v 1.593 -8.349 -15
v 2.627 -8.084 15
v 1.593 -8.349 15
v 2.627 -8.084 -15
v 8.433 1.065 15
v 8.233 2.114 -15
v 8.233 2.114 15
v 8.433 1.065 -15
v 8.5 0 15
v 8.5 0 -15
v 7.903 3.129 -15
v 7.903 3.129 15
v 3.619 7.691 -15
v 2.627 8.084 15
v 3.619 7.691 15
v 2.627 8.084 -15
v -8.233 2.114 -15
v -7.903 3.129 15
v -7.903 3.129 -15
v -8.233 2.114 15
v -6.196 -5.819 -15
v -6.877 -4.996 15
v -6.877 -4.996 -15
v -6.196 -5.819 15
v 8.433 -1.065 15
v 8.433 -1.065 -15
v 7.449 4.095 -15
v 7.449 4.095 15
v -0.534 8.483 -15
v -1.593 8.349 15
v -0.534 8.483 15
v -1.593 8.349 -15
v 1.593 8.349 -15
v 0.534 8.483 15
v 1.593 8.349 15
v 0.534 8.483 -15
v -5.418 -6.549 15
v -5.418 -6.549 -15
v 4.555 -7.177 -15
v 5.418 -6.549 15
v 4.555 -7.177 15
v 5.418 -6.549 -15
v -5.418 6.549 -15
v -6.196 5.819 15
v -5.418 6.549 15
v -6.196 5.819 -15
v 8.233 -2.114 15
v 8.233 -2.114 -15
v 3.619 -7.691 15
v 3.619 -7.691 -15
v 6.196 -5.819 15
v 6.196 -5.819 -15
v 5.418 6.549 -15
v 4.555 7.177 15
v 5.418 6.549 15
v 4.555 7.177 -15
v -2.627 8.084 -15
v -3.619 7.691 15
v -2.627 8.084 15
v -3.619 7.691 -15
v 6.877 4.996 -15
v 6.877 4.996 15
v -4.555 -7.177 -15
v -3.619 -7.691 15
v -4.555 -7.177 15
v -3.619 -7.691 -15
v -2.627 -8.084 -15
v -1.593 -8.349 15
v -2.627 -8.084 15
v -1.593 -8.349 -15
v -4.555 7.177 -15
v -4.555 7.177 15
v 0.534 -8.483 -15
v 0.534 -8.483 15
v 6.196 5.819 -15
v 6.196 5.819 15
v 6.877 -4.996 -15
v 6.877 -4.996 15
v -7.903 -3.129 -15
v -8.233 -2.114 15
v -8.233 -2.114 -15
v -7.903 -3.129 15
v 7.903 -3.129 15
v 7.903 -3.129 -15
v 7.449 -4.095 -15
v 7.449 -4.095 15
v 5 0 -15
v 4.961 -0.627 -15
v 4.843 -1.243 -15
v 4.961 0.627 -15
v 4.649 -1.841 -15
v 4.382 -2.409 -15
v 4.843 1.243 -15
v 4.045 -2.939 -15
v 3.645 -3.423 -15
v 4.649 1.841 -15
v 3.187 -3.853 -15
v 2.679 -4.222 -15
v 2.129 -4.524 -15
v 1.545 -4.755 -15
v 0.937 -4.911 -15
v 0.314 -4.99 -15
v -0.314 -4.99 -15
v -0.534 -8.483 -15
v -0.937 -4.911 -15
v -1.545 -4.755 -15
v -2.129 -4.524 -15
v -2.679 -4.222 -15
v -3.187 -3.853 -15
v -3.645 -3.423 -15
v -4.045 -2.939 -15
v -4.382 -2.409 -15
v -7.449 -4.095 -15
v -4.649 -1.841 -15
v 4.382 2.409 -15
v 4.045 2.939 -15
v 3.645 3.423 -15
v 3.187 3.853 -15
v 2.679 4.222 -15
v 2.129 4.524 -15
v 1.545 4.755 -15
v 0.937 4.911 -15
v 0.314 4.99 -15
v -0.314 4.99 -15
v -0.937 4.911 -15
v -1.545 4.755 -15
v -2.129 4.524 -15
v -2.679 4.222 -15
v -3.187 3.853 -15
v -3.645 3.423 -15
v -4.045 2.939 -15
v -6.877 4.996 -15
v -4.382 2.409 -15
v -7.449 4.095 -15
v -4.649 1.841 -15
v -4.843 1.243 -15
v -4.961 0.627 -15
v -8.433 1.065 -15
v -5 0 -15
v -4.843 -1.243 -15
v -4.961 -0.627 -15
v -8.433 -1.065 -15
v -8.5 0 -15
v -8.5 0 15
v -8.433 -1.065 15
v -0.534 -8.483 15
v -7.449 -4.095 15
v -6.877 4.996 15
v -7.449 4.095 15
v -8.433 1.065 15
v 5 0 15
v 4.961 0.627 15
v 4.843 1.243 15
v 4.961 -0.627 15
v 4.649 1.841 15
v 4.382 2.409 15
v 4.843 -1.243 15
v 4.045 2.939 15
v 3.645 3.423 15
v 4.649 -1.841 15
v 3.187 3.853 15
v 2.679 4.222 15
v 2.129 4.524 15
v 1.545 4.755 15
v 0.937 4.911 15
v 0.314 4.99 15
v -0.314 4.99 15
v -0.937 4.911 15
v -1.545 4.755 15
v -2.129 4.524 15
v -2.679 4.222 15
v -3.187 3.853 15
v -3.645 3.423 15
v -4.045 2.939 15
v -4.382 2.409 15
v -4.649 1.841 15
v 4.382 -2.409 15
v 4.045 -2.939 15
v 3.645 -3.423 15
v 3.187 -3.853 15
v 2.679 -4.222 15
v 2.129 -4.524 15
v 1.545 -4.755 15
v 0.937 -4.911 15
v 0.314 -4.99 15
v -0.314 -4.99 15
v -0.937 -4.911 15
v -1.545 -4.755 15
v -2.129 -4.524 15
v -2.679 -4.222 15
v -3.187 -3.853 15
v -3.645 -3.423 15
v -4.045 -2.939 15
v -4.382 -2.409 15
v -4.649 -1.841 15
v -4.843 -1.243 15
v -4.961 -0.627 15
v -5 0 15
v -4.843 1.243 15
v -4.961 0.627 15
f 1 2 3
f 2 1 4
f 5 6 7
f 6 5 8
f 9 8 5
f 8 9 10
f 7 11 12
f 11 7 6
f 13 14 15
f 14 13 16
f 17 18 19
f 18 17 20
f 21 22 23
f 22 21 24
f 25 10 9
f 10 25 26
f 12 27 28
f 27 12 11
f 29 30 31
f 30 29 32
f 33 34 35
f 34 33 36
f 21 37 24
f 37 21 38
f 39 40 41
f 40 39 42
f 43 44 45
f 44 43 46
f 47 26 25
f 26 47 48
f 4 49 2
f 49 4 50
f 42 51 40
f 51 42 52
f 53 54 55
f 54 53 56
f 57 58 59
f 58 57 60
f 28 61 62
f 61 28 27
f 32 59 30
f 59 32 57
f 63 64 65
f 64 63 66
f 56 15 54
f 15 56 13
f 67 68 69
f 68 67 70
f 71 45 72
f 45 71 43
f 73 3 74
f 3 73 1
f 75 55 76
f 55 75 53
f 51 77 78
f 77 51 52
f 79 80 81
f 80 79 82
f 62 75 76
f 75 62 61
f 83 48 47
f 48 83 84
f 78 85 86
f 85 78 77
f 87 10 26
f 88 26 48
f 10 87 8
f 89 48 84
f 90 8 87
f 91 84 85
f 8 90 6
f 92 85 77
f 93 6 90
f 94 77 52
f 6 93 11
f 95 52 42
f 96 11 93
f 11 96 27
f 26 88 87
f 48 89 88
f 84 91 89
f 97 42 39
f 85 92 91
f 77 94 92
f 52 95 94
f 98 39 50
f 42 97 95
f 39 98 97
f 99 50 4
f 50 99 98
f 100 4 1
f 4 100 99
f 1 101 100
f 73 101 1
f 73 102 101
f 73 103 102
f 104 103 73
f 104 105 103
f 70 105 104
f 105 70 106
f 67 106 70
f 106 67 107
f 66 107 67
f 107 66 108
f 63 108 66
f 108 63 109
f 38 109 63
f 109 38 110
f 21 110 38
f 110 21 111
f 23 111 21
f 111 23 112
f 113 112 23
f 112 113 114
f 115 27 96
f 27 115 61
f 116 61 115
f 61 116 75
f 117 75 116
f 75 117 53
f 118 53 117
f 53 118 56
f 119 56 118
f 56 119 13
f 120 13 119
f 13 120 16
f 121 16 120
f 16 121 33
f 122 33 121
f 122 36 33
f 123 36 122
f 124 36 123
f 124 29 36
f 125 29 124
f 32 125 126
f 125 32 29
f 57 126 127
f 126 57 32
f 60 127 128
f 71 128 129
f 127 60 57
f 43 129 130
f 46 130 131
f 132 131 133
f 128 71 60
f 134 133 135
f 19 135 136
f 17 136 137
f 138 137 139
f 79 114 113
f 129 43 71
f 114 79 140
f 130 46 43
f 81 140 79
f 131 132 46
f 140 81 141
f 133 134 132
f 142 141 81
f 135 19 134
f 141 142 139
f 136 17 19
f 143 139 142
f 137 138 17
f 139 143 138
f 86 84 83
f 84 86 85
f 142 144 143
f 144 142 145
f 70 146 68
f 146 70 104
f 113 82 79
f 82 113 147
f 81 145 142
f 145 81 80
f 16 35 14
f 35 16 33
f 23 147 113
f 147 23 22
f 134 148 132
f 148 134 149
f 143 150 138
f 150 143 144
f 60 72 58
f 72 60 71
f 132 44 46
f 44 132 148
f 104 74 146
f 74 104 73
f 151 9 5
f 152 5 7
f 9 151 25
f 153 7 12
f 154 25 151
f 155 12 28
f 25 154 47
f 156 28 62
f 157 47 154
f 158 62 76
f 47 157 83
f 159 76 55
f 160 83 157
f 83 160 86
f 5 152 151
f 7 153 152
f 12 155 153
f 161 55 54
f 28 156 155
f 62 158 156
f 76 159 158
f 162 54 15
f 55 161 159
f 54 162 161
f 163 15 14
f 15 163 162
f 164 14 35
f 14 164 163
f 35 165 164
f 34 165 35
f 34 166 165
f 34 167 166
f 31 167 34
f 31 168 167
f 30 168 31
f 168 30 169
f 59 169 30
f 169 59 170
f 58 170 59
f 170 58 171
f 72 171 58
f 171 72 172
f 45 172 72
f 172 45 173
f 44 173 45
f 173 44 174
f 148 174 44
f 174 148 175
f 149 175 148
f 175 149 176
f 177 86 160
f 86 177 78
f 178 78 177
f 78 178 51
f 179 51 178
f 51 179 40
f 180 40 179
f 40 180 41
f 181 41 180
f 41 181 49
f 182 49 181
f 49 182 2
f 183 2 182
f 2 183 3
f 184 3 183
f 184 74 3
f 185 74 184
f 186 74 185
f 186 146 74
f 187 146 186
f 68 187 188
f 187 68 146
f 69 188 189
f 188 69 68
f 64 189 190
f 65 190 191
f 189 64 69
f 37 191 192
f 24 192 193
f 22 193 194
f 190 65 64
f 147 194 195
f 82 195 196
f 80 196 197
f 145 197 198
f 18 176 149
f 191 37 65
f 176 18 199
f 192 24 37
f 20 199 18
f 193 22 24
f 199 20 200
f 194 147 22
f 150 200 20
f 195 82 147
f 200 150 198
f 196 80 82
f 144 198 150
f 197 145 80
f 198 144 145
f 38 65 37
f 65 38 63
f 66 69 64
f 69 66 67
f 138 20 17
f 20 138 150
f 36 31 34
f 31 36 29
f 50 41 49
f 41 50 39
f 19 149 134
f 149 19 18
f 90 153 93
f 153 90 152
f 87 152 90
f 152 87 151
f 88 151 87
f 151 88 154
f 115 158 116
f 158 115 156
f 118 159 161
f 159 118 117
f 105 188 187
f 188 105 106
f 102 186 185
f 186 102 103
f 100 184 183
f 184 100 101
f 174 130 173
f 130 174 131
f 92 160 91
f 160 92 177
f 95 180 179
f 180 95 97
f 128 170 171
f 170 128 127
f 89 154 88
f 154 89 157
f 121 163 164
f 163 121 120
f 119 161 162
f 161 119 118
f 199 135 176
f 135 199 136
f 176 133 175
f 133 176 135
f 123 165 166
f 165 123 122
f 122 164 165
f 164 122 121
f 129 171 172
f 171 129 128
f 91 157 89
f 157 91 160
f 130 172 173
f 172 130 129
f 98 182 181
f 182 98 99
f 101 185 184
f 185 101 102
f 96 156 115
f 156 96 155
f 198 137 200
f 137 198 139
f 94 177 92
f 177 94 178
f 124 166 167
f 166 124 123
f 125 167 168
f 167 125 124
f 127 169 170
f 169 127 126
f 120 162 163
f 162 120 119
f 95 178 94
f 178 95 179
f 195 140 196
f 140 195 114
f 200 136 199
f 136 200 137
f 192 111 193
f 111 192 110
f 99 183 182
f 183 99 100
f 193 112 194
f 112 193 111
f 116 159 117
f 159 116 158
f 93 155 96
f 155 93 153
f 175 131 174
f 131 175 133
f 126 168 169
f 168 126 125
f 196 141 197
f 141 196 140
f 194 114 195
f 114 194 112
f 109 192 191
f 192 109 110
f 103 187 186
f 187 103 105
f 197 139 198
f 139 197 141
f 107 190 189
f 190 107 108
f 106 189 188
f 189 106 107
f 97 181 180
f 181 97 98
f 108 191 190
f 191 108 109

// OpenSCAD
$fn = 50;


difference() {
	union() {
		translate(v = [0, 0, -15.0000000000]) {
			cylinder(h = 30, r = 8.5000000000);
		}
	}
	union() {
		translate(v = [0, 0, -100.0000000000]) {
			cylinder(h = 200, r = 5.0000000000);
		}
	}
}
